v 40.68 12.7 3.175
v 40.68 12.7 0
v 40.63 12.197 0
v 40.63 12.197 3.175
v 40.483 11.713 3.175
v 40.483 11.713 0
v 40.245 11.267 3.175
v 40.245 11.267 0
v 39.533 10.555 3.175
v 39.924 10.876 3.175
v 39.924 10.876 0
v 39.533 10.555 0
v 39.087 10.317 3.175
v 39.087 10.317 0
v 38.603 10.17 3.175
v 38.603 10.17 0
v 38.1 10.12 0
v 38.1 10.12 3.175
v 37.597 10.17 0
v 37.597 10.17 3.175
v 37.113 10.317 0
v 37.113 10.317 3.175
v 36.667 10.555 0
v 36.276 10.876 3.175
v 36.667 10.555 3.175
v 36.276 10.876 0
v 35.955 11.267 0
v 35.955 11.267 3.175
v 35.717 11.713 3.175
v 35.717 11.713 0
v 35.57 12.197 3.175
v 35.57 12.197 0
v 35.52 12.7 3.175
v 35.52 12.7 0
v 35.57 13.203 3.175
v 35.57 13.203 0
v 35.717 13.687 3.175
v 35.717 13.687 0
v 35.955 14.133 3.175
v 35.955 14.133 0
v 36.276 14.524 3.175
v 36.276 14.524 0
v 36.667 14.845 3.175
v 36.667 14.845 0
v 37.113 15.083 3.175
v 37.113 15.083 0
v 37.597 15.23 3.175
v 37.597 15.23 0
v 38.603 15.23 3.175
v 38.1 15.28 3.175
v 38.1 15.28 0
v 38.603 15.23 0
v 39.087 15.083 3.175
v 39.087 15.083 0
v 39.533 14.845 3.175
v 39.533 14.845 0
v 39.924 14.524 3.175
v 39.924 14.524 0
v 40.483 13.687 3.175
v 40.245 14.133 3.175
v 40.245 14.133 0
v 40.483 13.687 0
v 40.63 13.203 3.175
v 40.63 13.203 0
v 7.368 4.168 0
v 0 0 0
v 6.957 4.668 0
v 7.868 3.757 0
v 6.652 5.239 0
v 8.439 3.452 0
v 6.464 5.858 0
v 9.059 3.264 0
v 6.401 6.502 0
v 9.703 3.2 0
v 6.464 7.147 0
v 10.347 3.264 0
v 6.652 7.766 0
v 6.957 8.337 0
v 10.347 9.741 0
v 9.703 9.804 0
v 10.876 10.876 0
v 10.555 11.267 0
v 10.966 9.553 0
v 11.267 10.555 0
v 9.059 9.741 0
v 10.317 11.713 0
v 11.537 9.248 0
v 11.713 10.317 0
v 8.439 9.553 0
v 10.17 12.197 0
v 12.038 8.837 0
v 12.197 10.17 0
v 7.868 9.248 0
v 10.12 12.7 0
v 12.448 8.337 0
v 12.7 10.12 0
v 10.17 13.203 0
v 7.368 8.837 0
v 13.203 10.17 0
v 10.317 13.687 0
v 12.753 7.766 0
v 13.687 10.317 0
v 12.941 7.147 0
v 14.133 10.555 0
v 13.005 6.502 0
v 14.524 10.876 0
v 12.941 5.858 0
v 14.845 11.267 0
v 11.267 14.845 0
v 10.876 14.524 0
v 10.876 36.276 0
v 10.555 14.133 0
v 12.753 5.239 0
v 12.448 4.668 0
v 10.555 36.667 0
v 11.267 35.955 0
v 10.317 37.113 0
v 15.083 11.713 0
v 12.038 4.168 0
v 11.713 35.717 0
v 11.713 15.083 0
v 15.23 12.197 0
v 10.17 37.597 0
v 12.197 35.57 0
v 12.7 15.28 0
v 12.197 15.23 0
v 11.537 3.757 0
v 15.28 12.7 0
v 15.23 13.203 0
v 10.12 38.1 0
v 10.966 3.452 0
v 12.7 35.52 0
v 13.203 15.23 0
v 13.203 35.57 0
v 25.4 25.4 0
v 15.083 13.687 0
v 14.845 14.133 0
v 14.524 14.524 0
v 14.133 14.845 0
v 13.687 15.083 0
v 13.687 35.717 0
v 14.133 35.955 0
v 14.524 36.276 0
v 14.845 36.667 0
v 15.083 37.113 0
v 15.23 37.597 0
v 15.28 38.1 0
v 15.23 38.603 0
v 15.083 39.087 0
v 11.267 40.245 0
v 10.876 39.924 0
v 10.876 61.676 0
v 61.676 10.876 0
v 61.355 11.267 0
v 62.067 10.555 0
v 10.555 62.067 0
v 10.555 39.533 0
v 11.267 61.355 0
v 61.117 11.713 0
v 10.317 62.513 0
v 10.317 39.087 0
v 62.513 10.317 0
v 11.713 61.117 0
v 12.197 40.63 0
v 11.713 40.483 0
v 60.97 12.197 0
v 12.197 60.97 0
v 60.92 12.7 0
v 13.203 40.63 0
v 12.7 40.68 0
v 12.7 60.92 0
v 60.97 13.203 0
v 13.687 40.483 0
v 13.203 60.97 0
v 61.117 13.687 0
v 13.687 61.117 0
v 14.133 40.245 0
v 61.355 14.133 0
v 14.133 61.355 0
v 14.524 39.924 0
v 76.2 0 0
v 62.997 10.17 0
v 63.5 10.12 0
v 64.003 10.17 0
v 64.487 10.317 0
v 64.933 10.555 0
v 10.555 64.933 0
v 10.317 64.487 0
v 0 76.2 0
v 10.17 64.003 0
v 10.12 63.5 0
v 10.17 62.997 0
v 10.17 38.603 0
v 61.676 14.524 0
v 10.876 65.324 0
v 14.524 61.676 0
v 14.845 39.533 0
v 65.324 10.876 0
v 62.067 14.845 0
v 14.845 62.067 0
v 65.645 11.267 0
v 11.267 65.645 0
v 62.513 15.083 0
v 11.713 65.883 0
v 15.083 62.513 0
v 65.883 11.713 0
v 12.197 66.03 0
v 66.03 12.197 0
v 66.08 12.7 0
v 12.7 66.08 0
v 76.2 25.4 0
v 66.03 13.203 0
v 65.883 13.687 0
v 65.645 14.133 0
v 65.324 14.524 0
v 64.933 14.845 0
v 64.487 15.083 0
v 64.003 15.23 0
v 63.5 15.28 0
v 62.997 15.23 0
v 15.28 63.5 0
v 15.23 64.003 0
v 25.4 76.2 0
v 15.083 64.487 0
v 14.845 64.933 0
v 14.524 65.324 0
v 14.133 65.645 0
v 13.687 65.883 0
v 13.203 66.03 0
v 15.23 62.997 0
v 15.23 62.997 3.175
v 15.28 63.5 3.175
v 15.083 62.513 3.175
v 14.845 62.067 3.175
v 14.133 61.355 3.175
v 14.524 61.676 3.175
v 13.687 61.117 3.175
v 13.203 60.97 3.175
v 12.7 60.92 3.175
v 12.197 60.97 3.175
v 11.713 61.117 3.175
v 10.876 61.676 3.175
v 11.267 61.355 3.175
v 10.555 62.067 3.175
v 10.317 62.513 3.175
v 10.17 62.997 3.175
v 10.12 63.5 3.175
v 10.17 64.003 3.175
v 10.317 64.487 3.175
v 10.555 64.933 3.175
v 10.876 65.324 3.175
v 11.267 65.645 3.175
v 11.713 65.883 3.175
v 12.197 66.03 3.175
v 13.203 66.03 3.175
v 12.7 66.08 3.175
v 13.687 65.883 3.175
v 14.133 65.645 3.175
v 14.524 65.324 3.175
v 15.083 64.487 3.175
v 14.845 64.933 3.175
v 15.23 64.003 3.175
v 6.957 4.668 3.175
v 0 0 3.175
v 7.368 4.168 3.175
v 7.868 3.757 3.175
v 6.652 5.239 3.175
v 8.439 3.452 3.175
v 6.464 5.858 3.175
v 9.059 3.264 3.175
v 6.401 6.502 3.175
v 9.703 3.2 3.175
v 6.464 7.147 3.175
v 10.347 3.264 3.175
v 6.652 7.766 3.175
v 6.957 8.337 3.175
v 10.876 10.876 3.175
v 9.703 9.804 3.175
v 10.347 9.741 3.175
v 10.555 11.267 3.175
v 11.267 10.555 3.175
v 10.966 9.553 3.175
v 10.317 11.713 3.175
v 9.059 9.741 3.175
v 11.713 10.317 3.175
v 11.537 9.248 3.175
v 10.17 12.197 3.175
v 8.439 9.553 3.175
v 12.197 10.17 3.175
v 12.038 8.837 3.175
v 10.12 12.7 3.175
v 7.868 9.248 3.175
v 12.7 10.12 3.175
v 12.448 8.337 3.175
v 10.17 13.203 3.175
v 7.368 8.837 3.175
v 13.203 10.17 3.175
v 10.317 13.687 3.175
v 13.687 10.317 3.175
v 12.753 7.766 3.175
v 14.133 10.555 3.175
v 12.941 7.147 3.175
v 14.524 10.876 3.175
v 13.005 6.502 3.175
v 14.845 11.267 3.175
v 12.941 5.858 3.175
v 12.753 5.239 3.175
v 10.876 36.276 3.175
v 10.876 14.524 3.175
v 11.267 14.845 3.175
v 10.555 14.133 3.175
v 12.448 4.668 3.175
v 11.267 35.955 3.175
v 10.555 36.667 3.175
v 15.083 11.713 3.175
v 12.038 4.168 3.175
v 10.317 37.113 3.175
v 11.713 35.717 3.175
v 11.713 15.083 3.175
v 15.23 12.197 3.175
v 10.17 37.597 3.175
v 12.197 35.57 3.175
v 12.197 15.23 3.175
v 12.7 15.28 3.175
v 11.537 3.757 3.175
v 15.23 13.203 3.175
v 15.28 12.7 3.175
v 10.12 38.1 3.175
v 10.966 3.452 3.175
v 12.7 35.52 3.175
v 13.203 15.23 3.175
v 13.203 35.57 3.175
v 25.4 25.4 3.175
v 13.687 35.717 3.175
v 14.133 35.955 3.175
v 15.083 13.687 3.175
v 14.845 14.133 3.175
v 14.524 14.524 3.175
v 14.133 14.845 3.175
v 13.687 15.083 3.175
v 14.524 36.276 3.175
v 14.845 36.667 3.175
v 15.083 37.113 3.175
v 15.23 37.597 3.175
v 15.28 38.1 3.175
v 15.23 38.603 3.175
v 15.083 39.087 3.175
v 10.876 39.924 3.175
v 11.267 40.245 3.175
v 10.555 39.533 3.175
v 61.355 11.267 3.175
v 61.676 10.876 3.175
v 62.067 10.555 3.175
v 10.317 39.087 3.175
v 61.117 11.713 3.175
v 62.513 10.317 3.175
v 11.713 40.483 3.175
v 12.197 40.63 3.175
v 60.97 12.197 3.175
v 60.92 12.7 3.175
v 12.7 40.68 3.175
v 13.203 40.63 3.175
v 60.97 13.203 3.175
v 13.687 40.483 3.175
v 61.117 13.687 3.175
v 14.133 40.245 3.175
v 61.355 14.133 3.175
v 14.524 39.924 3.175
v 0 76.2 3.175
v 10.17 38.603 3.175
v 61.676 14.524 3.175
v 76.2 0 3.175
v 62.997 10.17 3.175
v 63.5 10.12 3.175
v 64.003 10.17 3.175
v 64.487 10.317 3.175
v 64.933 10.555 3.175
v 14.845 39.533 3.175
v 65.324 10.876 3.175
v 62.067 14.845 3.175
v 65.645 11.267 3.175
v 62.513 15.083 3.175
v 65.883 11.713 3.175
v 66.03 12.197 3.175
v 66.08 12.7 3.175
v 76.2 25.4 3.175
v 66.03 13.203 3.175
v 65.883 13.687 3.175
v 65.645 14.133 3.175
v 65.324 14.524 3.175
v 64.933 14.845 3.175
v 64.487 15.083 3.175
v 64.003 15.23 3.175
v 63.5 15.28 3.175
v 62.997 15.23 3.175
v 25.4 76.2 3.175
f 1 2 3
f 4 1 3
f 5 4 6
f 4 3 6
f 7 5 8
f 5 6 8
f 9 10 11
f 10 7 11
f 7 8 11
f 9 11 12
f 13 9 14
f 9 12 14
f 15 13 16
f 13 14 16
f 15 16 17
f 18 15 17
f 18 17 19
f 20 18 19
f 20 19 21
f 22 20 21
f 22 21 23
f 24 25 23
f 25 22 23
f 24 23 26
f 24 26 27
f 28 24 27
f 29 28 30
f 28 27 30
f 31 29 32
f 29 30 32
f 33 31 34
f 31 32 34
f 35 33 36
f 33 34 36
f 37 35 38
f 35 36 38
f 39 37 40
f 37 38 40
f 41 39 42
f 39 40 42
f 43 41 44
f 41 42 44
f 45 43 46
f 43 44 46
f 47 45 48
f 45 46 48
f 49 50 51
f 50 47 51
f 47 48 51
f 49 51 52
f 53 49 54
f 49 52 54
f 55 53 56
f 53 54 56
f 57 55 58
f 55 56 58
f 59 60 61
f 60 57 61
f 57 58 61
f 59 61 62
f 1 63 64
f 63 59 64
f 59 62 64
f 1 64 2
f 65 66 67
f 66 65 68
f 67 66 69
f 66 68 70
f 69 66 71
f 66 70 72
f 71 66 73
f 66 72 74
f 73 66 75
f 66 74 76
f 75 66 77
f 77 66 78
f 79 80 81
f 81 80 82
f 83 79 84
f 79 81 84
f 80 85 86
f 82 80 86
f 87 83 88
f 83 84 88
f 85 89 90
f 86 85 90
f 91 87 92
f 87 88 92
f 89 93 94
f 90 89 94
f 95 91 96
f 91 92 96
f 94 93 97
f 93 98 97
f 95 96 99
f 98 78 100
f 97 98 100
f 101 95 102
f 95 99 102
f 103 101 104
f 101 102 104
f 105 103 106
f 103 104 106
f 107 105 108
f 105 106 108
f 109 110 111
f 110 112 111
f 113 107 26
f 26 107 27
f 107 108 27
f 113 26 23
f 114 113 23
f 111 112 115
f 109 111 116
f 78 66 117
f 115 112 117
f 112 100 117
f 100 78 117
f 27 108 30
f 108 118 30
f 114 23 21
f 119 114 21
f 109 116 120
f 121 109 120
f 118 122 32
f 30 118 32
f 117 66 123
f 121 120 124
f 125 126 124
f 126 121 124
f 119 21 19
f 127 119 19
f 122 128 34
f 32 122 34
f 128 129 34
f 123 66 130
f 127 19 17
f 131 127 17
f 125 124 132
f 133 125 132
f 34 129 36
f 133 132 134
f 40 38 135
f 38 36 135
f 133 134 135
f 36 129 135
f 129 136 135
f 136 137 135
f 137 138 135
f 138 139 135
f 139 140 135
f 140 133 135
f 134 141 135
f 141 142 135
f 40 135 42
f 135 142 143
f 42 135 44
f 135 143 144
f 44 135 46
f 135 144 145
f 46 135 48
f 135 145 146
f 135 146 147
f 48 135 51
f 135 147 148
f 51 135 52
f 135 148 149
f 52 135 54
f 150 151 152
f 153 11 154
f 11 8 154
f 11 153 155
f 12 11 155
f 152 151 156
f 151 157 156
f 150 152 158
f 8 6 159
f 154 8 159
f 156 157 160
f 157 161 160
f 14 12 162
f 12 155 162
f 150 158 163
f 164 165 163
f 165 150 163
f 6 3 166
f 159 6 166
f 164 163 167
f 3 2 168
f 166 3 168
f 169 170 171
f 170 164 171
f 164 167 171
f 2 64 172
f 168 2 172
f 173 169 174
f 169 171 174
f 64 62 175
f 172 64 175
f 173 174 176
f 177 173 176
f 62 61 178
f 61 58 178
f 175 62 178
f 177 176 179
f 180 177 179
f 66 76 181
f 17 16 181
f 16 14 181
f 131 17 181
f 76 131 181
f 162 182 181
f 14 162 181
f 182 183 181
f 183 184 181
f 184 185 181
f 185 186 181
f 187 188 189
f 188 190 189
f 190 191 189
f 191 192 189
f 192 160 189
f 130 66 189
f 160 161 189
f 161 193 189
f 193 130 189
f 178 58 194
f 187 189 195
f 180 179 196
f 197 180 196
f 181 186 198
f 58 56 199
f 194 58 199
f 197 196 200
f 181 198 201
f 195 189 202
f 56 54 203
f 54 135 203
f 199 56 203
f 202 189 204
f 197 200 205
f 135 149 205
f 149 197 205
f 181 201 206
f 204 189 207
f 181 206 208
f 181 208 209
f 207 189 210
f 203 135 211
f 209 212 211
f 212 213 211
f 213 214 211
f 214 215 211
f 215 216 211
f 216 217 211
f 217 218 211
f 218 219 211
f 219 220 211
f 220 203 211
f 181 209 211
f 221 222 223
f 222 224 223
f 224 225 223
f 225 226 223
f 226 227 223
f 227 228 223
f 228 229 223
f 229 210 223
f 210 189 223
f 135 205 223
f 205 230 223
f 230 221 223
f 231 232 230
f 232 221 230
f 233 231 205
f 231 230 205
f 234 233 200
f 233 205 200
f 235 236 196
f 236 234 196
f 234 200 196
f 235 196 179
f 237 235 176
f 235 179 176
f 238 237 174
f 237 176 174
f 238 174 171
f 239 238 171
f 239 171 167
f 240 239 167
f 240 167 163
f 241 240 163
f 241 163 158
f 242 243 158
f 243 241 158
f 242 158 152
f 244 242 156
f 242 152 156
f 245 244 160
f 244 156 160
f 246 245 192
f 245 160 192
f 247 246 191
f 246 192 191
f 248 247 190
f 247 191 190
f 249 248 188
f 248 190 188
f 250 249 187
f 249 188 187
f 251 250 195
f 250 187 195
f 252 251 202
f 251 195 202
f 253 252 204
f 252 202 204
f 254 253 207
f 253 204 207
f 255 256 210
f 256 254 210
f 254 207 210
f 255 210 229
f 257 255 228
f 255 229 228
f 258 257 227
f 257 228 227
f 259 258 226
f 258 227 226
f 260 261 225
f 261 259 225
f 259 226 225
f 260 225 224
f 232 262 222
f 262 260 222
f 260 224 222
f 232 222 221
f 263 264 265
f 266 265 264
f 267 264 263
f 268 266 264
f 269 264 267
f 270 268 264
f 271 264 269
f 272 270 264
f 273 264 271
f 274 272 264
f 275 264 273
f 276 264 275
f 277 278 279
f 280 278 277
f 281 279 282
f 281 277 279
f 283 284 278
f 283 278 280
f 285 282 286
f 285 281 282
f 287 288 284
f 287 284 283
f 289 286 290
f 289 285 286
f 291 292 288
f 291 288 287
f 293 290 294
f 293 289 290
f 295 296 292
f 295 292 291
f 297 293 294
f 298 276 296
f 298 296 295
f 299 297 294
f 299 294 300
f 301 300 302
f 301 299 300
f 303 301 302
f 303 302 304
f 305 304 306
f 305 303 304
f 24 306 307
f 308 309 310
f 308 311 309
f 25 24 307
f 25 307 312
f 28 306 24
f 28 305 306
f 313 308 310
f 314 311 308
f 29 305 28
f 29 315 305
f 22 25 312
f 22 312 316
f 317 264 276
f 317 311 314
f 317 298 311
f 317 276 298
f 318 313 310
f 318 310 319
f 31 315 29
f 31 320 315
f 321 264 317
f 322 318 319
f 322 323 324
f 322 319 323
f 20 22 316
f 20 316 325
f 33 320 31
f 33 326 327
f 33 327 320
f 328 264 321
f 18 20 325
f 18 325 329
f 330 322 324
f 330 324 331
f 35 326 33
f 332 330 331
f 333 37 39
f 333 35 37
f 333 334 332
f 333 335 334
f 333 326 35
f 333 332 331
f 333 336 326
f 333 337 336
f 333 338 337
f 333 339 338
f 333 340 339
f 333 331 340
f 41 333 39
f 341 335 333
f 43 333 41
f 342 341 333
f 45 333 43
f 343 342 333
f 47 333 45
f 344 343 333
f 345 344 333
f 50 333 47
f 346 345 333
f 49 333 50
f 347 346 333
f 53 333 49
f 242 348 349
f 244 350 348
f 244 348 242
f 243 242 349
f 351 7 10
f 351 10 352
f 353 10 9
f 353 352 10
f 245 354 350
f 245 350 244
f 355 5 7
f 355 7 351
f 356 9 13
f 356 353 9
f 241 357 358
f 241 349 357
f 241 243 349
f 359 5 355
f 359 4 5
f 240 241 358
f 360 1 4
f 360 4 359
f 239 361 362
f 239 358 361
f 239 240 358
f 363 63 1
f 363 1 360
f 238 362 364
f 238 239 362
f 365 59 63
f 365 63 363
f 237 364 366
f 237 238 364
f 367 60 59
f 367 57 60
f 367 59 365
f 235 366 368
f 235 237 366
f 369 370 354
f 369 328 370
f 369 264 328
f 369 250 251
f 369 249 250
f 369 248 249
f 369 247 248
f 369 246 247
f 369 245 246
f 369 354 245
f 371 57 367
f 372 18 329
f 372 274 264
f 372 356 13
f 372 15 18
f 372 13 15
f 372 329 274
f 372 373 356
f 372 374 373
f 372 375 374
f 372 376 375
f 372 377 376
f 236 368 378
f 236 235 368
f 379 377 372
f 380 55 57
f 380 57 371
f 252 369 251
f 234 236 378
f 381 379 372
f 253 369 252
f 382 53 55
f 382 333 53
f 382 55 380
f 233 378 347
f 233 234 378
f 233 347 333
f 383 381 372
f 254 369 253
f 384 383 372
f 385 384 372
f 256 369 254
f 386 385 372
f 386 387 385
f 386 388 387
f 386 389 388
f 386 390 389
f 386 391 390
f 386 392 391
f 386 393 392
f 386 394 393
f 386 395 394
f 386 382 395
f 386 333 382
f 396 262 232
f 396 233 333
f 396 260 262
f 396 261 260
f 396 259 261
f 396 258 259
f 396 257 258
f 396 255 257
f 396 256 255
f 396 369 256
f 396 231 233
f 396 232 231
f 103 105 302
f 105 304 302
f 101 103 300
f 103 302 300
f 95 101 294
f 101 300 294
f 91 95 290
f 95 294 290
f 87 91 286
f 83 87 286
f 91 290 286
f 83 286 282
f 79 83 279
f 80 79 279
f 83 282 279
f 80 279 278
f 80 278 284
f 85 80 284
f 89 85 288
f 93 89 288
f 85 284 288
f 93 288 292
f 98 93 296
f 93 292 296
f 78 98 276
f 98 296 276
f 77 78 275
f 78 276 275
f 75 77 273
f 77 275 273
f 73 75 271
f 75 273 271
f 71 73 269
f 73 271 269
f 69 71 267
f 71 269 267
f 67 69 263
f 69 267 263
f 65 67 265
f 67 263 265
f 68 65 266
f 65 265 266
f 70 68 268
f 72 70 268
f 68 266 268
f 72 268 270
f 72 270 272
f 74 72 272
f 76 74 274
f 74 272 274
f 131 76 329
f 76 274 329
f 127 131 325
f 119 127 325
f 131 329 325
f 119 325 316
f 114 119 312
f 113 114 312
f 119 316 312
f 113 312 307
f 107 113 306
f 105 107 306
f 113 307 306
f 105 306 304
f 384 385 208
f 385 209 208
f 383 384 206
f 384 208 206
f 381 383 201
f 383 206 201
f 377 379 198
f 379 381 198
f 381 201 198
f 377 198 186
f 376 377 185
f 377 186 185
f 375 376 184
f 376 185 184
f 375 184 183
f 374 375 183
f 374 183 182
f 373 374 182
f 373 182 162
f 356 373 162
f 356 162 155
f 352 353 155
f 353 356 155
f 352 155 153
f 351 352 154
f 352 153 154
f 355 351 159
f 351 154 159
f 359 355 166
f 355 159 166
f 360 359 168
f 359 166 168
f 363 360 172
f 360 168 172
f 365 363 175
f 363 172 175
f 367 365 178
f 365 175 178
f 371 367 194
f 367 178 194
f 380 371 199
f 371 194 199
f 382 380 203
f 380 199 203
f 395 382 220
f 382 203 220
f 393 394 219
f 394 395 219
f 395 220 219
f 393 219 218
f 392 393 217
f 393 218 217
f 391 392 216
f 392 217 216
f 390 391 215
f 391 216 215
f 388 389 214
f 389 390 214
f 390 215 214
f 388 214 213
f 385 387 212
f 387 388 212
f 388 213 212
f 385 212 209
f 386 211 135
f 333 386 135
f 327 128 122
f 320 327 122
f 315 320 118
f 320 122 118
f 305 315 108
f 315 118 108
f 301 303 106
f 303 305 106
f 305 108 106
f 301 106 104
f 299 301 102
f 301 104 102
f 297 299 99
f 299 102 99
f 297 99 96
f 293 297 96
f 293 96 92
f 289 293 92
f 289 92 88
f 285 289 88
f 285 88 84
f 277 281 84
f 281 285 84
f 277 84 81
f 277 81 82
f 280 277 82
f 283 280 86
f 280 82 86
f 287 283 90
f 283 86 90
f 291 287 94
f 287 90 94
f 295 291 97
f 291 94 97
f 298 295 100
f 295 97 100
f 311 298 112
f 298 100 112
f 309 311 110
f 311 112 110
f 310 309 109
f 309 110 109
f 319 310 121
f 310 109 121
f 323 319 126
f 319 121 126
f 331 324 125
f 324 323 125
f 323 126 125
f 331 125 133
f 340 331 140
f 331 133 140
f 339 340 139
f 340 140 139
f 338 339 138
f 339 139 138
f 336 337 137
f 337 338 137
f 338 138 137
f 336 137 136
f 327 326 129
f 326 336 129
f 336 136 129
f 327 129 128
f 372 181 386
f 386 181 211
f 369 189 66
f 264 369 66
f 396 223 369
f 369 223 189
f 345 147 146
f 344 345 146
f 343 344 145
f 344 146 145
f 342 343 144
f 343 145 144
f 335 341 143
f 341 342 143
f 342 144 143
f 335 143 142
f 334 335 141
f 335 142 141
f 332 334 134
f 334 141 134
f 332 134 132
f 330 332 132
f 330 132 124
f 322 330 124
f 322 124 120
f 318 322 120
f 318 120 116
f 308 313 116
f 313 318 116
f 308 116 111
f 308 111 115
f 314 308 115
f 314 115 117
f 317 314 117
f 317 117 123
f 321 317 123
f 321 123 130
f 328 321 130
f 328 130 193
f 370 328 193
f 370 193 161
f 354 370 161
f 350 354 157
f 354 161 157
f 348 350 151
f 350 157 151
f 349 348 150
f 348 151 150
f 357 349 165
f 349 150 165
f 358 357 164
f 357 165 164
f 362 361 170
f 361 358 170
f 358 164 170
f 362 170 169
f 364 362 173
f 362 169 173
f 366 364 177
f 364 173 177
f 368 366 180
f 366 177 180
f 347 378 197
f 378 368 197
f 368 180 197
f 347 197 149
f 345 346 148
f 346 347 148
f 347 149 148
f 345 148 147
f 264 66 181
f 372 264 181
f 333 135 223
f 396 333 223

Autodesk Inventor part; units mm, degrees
ref_plane "YZ Plane" through (0, 0, 0) normal (1, 0, 0) x (0, 1, 0)
ref_plane "XZ Plane" through (0, 0, 0) normal (0, 1, 0) x (-1, 0, 0)
ref_plane "XY Plane" through (0, 0, 0) normal (0, 0, 1) x (1, 0, 0)
sketch "Sketch1" plane through (0, 0, 0) normal (0, 0, 1) x (1, 0, 0)
  line L0 (0, 0) -> (76.2, 0)
  line L1 (76.2, 0) -> (76.2, 25.4)
  line L2 (76.2, 25.4) -> (25.4, 25.4)
  line L3 (0, 25.4) -> (0, 0)
  line L4 (0, 0) -> (25.4, 0)
  line L5 (25.4, 25.4) -> (25.4, 76.2)
  line L6 (25.4, 76.2) -> (0, 76.2)
  line L7 (0, 76.2) -> (0, 0)
  line L8 (12.7, 76.2) -> (12.7, 63.5) construction
  line L9 (12.7, 63.5) -> (12.7, 38.1) construction
  line L10 (12.7, 38.1) -> (12.7, 12.7) construction
  line L11 (12.7, 12.7) -> (38.1, 12.7) construction
  line L12 (38.1, 12.7) -> (63.5, 12.7) construction
  circle A0 centre (12.7, 63.5) radius 2.5797
  circle A1 centre (12.7, 38.1) radius 2.5797
  circle A2 centre (12.7, 12.7) radius 2.5797
  circle A3 centre (38.1, 12.7) radius 2.5797
  circle A4 centre (63.5, 12.7) radius 2.5797
  dimension "d0" = 76.2
  dimension "d1" = 25.4
  dimension "d2" = 25.4
  dimension "d3" = 76.2
  dimension "d4" = 12.7
  dimension "d5" = 25.4
  dimension "d6" = 25.4
  dimension "d7" = 25.4
  dimension "d8" = 25.4
  dimension "d9" = 5.1594
extrude "Extrusion1" add sketch "Sketch1" along normal blind 3.175
sketch "Sketch2" plane through (0, 0, 3.175) normal (0, 0, 1) x (1, 0, 0)
  line L0 (0, 0) -> (76.2, 0) construction
  line L1 (0, 0) -> (9.7028, 0) construction
  line L2 (9.7028, 0) -> (9.7028, 6.5024) construction
  circle A0 centre (9.7028, 6.5024) radius 3.302
  dimension "d12" = 9.7028
  dimension "d13" = 6.5024
  dimension "d14" = 6.604
extrude "Extrusion2" cut sketch "Sketch2" against normal blind 25.4
properties part number "L gusset"
